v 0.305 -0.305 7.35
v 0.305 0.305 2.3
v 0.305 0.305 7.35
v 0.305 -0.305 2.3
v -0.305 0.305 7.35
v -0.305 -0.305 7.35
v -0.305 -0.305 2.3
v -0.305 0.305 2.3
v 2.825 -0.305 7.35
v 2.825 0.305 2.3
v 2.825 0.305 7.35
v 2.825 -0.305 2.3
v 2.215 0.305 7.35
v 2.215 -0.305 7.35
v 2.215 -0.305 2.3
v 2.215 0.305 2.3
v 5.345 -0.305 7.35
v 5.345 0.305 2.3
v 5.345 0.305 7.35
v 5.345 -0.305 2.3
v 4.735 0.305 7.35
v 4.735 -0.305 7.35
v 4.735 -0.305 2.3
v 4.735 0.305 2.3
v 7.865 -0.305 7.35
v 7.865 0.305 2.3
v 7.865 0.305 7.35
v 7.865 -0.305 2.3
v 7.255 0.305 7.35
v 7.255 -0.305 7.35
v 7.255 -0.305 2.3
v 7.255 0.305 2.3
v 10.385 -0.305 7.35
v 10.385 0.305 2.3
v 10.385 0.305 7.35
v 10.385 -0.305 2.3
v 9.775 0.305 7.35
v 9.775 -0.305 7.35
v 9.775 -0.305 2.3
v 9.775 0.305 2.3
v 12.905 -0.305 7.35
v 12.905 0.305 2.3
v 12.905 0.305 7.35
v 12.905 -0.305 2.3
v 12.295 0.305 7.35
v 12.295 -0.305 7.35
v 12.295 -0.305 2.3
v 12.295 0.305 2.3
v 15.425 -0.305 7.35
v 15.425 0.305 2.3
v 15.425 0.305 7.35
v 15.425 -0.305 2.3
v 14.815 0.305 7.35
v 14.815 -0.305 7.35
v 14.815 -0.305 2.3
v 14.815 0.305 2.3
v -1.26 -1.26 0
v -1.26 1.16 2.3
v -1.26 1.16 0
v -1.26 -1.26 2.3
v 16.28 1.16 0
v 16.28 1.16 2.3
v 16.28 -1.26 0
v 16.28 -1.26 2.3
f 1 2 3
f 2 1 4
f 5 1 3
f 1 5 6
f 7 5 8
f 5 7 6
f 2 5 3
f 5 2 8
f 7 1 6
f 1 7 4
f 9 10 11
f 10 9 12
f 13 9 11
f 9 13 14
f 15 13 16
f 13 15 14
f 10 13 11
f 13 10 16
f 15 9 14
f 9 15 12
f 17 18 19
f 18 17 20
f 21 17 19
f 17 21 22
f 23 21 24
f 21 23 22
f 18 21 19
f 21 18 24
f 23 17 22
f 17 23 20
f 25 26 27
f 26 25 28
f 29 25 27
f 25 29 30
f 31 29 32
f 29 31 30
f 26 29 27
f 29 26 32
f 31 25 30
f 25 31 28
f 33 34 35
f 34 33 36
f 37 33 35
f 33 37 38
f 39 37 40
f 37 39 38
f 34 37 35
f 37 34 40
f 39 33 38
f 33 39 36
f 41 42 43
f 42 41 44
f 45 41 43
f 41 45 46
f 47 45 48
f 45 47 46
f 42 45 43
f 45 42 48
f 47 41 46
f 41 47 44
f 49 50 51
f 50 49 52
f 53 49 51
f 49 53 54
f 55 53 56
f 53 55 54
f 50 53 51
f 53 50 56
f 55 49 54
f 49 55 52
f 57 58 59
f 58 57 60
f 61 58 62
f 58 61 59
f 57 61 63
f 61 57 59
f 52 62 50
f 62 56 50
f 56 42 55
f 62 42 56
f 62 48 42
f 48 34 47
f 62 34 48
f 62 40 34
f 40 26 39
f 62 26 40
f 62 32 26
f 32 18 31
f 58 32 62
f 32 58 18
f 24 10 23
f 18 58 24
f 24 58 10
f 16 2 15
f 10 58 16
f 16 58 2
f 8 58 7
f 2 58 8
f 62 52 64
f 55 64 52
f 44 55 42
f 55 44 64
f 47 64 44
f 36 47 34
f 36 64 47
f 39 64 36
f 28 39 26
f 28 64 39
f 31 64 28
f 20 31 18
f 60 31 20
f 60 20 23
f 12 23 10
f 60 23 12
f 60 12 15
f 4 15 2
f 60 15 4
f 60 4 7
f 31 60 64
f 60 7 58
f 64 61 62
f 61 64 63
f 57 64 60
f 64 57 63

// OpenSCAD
module connector(n=3, step=2.52, pins = true) {
    translate([-step/2, -step/2])
    union(){
        if (pins){
            for(i = [0 : n-1]){
                color([.2,.2,.2])
                translate([i*step,0,2.4]) cube([step-0.1, step-0.1, 14]);
            };
        } else {
            for(i = [0 : n-1]){
                color([1,1,.7])
                translate([step/2,step/2,2.5])
                translate([i*step,0,2.3]) cube([.61, .61, 5.1], center=true);
            };
        };
        color([.2,.2,.2])
        hull(){
            for(i = [0, n-1]){
                translate([i*step,0,0]) cube([step-0.1, step-0.1, 2.3]);
            };
        };
    };
};

connector(7, pins = false);
